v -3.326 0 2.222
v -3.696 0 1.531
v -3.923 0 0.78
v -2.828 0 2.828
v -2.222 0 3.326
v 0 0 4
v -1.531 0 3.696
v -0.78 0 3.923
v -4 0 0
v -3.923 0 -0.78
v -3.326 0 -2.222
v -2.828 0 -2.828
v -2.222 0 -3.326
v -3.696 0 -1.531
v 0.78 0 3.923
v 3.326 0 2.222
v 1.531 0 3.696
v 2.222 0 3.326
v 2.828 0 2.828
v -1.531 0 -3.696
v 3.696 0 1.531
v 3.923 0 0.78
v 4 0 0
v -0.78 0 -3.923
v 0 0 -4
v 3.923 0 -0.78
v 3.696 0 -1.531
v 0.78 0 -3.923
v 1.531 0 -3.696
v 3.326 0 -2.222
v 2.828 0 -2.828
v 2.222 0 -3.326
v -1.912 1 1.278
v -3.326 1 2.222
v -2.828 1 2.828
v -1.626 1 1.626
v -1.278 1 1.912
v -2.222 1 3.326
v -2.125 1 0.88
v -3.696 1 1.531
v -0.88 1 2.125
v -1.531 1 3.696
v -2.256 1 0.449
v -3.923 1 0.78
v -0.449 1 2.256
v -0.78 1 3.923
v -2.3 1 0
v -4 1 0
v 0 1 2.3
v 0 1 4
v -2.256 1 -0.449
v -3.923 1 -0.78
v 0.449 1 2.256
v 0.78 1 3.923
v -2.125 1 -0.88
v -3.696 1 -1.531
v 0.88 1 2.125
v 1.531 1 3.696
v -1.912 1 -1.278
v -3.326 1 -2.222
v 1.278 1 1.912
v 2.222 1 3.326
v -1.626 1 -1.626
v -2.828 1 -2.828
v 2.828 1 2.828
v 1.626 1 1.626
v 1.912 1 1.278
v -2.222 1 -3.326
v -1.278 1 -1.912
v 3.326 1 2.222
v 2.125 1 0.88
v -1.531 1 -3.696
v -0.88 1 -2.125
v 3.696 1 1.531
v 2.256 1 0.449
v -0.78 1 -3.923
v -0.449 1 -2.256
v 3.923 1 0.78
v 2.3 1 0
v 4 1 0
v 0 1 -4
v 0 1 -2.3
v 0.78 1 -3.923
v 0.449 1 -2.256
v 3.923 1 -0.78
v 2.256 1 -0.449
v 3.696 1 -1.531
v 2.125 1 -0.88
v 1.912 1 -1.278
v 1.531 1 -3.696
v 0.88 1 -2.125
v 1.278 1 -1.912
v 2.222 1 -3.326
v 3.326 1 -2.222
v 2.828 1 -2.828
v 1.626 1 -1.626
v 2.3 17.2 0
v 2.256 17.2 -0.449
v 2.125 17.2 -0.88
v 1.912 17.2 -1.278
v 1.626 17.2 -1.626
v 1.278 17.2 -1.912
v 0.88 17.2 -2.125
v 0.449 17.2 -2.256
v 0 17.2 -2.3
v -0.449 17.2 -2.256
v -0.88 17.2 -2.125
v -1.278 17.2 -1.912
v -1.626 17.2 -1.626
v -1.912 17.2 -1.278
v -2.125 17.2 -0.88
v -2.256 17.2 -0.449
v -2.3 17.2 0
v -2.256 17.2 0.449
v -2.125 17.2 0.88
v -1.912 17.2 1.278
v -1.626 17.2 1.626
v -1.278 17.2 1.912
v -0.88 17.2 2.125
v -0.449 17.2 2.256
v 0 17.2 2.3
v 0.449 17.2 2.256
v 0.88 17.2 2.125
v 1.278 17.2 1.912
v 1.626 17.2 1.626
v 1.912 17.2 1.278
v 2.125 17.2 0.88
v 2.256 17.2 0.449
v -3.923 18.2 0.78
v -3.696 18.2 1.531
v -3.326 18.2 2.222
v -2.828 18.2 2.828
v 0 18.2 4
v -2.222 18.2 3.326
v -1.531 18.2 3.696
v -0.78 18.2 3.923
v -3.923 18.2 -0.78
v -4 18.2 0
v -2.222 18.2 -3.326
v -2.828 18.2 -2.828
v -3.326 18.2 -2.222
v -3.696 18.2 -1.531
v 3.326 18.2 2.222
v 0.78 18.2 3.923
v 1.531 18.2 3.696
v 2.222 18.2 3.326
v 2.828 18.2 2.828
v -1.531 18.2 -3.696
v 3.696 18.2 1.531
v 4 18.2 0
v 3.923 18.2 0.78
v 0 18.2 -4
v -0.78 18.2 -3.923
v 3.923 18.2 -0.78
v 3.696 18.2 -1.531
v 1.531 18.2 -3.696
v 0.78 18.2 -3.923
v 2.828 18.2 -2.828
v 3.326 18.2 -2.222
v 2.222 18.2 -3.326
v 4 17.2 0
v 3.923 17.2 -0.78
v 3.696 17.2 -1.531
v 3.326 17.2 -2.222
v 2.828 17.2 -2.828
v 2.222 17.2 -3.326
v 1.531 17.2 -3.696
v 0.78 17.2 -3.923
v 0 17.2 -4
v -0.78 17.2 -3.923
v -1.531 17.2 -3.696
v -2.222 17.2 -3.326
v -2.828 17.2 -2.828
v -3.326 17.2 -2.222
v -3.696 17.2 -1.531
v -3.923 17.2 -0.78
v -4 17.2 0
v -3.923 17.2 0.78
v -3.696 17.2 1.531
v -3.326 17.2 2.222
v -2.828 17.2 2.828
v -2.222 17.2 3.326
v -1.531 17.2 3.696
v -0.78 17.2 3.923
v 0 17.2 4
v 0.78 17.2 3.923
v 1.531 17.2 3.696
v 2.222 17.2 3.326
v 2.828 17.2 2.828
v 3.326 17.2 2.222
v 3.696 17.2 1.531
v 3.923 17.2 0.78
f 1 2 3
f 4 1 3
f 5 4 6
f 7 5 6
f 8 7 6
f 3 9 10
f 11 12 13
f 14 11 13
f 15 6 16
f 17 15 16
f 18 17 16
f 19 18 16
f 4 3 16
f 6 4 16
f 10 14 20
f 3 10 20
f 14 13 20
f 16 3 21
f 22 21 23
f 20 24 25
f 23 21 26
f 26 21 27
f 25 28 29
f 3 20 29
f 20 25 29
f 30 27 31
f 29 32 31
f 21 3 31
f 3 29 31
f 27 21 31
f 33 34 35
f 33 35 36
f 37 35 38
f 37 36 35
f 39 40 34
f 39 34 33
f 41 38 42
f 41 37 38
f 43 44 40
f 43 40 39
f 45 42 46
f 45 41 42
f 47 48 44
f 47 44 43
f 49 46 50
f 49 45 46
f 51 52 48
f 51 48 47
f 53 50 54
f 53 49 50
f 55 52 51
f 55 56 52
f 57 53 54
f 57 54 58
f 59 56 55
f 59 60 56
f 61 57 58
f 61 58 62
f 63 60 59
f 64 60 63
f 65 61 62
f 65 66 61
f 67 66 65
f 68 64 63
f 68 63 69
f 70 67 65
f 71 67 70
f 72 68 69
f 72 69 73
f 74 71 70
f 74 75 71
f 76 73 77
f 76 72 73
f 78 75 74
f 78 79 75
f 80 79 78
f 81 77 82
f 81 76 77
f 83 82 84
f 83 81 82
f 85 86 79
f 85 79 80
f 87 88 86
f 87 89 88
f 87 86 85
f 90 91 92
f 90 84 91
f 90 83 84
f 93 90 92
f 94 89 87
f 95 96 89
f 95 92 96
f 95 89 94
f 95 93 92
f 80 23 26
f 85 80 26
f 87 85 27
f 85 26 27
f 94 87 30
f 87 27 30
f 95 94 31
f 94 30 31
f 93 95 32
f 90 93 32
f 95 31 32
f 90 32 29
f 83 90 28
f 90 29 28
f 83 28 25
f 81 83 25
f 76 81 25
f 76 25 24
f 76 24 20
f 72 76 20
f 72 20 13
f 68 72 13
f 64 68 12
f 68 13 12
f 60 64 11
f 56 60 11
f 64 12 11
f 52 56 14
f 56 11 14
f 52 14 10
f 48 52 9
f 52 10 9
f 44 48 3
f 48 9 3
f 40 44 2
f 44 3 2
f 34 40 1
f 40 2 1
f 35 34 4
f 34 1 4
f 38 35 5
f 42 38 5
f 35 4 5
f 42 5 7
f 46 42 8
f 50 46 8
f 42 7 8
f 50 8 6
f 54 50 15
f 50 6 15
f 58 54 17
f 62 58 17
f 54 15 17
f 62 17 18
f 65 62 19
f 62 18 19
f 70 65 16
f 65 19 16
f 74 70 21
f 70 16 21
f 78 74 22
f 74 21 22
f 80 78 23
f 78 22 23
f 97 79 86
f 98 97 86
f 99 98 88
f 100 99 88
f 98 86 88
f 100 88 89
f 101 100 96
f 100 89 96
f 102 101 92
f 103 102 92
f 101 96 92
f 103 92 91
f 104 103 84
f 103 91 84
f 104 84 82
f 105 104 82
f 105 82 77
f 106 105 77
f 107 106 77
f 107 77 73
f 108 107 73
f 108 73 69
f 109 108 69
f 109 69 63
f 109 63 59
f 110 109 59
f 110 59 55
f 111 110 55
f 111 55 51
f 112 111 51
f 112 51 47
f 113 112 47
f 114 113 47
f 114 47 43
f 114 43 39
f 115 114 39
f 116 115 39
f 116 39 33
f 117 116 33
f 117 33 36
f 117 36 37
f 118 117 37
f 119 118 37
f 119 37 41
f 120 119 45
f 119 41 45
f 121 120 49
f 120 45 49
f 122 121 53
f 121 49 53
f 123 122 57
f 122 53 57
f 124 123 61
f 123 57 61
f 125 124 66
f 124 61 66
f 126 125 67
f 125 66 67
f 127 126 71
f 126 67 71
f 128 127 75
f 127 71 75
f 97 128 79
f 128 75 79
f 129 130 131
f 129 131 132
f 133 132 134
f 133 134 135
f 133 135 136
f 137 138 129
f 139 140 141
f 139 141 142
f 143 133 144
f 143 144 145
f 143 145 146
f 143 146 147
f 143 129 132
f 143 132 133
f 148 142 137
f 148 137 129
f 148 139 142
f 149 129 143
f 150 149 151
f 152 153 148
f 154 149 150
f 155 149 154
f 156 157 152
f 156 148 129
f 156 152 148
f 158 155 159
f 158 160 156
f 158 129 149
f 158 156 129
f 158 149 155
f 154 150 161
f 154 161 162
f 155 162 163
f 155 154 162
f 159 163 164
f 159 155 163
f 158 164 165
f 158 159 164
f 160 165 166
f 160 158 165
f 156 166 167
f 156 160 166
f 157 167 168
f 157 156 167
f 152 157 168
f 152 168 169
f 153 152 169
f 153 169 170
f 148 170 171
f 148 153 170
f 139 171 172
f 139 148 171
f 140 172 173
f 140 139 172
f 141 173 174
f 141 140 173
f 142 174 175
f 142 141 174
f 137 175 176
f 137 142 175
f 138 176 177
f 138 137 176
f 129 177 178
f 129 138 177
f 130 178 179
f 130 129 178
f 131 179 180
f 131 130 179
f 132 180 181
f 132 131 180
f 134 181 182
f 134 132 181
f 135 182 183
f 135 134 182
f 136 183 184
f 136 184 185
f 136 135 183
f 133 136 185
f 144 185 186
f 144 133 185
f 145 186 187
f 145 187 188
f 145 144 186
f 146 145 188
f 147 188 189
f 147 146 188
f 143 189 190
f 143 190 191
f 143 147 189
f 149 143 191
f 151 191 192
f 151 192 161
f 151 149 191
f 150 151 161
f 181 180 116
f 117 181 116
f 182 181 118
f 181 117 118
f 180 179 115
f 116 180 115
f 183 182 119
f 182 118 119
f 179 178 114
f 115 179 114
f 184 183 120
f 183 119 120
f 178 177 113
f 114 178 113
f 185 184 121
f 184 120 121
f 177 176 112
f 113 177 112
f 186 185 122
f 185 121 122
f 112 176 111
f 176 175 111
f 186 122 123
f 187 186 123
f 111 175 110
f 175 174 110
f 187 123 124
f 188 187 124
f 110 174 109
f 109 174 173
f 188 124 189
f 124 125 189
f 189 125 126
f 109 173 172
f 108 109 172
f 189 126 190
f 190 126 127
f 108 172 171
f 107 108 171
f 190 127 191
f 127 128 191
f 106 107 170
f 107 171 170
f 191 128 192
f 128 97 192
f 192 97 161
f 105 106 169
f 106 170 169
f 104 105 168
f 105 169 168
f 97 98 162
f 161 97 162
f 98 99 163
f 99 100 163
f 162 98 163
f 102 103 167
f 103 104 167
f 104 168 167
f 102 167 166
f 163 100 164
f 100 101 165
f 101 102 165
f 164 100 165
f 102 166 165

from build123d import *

# Parameters (mm, degrees)
SKETCH1_R           = 2.3
BOSS_EXTRUDE1_DEPTH = 18.2
BOSS_EXTRUDE2_START = 9.1
SKETCH2_R           = 4
SKETCH2_R_2         = 2.3
BOSS_EXTRUDE2_DEPTH = 1
BOSS_EXTRUDE3_START = -9.1
SKETCH2_3_R         = 4
SKETCH2_3_R_2       = 2.3
BOSS_EXTRUDE3_DEPTH = 1


with BuildPart() as part:
    # Sketch1 → Boss-Extrude1 (new body)
    with BuildSketch(Plane(origin=(0, 0, 0), x_dir=(1, 0, 0), z_dir=(0, 1, 0))):
        Circle(SKETCH1_R)
    extrude(amount=BOSS_EXTRUDE1_DEPTH)

    # Sketch2 → Boss-Extrude2 (add)
    with BuildSketch(Plane(origin=(0, 9.1, 0), x_dir=(1, 0, 0), z_dir=(0, 1, 0)).offset(BOSS_EXTRUDE2_START)):
        Circle(SKETCH2_R)
        Circle(SKETCH2_R_2, mode=Mode.SUBTRACT)
    extrude(amount=-BOSS_EXTRUDE2_DEPTH)

    # Sketch2<3> → Boss-Extrude3 (add)
    with BuildSketch(Plane(origin=(0, 9.1, 0), x_dir=(1, 0, 0), z_dir=(0, 1, 0)).offset(BOSS_EXTRUDE3_START)):
        Circle(SKETCH2_3_R)
        Circle(SKETCH2_3_R_2, mode=Mode.SUBTRACT)
    extrude(amount=BOSS_EXTRUDE3_DEPTH)


solid = part.part
